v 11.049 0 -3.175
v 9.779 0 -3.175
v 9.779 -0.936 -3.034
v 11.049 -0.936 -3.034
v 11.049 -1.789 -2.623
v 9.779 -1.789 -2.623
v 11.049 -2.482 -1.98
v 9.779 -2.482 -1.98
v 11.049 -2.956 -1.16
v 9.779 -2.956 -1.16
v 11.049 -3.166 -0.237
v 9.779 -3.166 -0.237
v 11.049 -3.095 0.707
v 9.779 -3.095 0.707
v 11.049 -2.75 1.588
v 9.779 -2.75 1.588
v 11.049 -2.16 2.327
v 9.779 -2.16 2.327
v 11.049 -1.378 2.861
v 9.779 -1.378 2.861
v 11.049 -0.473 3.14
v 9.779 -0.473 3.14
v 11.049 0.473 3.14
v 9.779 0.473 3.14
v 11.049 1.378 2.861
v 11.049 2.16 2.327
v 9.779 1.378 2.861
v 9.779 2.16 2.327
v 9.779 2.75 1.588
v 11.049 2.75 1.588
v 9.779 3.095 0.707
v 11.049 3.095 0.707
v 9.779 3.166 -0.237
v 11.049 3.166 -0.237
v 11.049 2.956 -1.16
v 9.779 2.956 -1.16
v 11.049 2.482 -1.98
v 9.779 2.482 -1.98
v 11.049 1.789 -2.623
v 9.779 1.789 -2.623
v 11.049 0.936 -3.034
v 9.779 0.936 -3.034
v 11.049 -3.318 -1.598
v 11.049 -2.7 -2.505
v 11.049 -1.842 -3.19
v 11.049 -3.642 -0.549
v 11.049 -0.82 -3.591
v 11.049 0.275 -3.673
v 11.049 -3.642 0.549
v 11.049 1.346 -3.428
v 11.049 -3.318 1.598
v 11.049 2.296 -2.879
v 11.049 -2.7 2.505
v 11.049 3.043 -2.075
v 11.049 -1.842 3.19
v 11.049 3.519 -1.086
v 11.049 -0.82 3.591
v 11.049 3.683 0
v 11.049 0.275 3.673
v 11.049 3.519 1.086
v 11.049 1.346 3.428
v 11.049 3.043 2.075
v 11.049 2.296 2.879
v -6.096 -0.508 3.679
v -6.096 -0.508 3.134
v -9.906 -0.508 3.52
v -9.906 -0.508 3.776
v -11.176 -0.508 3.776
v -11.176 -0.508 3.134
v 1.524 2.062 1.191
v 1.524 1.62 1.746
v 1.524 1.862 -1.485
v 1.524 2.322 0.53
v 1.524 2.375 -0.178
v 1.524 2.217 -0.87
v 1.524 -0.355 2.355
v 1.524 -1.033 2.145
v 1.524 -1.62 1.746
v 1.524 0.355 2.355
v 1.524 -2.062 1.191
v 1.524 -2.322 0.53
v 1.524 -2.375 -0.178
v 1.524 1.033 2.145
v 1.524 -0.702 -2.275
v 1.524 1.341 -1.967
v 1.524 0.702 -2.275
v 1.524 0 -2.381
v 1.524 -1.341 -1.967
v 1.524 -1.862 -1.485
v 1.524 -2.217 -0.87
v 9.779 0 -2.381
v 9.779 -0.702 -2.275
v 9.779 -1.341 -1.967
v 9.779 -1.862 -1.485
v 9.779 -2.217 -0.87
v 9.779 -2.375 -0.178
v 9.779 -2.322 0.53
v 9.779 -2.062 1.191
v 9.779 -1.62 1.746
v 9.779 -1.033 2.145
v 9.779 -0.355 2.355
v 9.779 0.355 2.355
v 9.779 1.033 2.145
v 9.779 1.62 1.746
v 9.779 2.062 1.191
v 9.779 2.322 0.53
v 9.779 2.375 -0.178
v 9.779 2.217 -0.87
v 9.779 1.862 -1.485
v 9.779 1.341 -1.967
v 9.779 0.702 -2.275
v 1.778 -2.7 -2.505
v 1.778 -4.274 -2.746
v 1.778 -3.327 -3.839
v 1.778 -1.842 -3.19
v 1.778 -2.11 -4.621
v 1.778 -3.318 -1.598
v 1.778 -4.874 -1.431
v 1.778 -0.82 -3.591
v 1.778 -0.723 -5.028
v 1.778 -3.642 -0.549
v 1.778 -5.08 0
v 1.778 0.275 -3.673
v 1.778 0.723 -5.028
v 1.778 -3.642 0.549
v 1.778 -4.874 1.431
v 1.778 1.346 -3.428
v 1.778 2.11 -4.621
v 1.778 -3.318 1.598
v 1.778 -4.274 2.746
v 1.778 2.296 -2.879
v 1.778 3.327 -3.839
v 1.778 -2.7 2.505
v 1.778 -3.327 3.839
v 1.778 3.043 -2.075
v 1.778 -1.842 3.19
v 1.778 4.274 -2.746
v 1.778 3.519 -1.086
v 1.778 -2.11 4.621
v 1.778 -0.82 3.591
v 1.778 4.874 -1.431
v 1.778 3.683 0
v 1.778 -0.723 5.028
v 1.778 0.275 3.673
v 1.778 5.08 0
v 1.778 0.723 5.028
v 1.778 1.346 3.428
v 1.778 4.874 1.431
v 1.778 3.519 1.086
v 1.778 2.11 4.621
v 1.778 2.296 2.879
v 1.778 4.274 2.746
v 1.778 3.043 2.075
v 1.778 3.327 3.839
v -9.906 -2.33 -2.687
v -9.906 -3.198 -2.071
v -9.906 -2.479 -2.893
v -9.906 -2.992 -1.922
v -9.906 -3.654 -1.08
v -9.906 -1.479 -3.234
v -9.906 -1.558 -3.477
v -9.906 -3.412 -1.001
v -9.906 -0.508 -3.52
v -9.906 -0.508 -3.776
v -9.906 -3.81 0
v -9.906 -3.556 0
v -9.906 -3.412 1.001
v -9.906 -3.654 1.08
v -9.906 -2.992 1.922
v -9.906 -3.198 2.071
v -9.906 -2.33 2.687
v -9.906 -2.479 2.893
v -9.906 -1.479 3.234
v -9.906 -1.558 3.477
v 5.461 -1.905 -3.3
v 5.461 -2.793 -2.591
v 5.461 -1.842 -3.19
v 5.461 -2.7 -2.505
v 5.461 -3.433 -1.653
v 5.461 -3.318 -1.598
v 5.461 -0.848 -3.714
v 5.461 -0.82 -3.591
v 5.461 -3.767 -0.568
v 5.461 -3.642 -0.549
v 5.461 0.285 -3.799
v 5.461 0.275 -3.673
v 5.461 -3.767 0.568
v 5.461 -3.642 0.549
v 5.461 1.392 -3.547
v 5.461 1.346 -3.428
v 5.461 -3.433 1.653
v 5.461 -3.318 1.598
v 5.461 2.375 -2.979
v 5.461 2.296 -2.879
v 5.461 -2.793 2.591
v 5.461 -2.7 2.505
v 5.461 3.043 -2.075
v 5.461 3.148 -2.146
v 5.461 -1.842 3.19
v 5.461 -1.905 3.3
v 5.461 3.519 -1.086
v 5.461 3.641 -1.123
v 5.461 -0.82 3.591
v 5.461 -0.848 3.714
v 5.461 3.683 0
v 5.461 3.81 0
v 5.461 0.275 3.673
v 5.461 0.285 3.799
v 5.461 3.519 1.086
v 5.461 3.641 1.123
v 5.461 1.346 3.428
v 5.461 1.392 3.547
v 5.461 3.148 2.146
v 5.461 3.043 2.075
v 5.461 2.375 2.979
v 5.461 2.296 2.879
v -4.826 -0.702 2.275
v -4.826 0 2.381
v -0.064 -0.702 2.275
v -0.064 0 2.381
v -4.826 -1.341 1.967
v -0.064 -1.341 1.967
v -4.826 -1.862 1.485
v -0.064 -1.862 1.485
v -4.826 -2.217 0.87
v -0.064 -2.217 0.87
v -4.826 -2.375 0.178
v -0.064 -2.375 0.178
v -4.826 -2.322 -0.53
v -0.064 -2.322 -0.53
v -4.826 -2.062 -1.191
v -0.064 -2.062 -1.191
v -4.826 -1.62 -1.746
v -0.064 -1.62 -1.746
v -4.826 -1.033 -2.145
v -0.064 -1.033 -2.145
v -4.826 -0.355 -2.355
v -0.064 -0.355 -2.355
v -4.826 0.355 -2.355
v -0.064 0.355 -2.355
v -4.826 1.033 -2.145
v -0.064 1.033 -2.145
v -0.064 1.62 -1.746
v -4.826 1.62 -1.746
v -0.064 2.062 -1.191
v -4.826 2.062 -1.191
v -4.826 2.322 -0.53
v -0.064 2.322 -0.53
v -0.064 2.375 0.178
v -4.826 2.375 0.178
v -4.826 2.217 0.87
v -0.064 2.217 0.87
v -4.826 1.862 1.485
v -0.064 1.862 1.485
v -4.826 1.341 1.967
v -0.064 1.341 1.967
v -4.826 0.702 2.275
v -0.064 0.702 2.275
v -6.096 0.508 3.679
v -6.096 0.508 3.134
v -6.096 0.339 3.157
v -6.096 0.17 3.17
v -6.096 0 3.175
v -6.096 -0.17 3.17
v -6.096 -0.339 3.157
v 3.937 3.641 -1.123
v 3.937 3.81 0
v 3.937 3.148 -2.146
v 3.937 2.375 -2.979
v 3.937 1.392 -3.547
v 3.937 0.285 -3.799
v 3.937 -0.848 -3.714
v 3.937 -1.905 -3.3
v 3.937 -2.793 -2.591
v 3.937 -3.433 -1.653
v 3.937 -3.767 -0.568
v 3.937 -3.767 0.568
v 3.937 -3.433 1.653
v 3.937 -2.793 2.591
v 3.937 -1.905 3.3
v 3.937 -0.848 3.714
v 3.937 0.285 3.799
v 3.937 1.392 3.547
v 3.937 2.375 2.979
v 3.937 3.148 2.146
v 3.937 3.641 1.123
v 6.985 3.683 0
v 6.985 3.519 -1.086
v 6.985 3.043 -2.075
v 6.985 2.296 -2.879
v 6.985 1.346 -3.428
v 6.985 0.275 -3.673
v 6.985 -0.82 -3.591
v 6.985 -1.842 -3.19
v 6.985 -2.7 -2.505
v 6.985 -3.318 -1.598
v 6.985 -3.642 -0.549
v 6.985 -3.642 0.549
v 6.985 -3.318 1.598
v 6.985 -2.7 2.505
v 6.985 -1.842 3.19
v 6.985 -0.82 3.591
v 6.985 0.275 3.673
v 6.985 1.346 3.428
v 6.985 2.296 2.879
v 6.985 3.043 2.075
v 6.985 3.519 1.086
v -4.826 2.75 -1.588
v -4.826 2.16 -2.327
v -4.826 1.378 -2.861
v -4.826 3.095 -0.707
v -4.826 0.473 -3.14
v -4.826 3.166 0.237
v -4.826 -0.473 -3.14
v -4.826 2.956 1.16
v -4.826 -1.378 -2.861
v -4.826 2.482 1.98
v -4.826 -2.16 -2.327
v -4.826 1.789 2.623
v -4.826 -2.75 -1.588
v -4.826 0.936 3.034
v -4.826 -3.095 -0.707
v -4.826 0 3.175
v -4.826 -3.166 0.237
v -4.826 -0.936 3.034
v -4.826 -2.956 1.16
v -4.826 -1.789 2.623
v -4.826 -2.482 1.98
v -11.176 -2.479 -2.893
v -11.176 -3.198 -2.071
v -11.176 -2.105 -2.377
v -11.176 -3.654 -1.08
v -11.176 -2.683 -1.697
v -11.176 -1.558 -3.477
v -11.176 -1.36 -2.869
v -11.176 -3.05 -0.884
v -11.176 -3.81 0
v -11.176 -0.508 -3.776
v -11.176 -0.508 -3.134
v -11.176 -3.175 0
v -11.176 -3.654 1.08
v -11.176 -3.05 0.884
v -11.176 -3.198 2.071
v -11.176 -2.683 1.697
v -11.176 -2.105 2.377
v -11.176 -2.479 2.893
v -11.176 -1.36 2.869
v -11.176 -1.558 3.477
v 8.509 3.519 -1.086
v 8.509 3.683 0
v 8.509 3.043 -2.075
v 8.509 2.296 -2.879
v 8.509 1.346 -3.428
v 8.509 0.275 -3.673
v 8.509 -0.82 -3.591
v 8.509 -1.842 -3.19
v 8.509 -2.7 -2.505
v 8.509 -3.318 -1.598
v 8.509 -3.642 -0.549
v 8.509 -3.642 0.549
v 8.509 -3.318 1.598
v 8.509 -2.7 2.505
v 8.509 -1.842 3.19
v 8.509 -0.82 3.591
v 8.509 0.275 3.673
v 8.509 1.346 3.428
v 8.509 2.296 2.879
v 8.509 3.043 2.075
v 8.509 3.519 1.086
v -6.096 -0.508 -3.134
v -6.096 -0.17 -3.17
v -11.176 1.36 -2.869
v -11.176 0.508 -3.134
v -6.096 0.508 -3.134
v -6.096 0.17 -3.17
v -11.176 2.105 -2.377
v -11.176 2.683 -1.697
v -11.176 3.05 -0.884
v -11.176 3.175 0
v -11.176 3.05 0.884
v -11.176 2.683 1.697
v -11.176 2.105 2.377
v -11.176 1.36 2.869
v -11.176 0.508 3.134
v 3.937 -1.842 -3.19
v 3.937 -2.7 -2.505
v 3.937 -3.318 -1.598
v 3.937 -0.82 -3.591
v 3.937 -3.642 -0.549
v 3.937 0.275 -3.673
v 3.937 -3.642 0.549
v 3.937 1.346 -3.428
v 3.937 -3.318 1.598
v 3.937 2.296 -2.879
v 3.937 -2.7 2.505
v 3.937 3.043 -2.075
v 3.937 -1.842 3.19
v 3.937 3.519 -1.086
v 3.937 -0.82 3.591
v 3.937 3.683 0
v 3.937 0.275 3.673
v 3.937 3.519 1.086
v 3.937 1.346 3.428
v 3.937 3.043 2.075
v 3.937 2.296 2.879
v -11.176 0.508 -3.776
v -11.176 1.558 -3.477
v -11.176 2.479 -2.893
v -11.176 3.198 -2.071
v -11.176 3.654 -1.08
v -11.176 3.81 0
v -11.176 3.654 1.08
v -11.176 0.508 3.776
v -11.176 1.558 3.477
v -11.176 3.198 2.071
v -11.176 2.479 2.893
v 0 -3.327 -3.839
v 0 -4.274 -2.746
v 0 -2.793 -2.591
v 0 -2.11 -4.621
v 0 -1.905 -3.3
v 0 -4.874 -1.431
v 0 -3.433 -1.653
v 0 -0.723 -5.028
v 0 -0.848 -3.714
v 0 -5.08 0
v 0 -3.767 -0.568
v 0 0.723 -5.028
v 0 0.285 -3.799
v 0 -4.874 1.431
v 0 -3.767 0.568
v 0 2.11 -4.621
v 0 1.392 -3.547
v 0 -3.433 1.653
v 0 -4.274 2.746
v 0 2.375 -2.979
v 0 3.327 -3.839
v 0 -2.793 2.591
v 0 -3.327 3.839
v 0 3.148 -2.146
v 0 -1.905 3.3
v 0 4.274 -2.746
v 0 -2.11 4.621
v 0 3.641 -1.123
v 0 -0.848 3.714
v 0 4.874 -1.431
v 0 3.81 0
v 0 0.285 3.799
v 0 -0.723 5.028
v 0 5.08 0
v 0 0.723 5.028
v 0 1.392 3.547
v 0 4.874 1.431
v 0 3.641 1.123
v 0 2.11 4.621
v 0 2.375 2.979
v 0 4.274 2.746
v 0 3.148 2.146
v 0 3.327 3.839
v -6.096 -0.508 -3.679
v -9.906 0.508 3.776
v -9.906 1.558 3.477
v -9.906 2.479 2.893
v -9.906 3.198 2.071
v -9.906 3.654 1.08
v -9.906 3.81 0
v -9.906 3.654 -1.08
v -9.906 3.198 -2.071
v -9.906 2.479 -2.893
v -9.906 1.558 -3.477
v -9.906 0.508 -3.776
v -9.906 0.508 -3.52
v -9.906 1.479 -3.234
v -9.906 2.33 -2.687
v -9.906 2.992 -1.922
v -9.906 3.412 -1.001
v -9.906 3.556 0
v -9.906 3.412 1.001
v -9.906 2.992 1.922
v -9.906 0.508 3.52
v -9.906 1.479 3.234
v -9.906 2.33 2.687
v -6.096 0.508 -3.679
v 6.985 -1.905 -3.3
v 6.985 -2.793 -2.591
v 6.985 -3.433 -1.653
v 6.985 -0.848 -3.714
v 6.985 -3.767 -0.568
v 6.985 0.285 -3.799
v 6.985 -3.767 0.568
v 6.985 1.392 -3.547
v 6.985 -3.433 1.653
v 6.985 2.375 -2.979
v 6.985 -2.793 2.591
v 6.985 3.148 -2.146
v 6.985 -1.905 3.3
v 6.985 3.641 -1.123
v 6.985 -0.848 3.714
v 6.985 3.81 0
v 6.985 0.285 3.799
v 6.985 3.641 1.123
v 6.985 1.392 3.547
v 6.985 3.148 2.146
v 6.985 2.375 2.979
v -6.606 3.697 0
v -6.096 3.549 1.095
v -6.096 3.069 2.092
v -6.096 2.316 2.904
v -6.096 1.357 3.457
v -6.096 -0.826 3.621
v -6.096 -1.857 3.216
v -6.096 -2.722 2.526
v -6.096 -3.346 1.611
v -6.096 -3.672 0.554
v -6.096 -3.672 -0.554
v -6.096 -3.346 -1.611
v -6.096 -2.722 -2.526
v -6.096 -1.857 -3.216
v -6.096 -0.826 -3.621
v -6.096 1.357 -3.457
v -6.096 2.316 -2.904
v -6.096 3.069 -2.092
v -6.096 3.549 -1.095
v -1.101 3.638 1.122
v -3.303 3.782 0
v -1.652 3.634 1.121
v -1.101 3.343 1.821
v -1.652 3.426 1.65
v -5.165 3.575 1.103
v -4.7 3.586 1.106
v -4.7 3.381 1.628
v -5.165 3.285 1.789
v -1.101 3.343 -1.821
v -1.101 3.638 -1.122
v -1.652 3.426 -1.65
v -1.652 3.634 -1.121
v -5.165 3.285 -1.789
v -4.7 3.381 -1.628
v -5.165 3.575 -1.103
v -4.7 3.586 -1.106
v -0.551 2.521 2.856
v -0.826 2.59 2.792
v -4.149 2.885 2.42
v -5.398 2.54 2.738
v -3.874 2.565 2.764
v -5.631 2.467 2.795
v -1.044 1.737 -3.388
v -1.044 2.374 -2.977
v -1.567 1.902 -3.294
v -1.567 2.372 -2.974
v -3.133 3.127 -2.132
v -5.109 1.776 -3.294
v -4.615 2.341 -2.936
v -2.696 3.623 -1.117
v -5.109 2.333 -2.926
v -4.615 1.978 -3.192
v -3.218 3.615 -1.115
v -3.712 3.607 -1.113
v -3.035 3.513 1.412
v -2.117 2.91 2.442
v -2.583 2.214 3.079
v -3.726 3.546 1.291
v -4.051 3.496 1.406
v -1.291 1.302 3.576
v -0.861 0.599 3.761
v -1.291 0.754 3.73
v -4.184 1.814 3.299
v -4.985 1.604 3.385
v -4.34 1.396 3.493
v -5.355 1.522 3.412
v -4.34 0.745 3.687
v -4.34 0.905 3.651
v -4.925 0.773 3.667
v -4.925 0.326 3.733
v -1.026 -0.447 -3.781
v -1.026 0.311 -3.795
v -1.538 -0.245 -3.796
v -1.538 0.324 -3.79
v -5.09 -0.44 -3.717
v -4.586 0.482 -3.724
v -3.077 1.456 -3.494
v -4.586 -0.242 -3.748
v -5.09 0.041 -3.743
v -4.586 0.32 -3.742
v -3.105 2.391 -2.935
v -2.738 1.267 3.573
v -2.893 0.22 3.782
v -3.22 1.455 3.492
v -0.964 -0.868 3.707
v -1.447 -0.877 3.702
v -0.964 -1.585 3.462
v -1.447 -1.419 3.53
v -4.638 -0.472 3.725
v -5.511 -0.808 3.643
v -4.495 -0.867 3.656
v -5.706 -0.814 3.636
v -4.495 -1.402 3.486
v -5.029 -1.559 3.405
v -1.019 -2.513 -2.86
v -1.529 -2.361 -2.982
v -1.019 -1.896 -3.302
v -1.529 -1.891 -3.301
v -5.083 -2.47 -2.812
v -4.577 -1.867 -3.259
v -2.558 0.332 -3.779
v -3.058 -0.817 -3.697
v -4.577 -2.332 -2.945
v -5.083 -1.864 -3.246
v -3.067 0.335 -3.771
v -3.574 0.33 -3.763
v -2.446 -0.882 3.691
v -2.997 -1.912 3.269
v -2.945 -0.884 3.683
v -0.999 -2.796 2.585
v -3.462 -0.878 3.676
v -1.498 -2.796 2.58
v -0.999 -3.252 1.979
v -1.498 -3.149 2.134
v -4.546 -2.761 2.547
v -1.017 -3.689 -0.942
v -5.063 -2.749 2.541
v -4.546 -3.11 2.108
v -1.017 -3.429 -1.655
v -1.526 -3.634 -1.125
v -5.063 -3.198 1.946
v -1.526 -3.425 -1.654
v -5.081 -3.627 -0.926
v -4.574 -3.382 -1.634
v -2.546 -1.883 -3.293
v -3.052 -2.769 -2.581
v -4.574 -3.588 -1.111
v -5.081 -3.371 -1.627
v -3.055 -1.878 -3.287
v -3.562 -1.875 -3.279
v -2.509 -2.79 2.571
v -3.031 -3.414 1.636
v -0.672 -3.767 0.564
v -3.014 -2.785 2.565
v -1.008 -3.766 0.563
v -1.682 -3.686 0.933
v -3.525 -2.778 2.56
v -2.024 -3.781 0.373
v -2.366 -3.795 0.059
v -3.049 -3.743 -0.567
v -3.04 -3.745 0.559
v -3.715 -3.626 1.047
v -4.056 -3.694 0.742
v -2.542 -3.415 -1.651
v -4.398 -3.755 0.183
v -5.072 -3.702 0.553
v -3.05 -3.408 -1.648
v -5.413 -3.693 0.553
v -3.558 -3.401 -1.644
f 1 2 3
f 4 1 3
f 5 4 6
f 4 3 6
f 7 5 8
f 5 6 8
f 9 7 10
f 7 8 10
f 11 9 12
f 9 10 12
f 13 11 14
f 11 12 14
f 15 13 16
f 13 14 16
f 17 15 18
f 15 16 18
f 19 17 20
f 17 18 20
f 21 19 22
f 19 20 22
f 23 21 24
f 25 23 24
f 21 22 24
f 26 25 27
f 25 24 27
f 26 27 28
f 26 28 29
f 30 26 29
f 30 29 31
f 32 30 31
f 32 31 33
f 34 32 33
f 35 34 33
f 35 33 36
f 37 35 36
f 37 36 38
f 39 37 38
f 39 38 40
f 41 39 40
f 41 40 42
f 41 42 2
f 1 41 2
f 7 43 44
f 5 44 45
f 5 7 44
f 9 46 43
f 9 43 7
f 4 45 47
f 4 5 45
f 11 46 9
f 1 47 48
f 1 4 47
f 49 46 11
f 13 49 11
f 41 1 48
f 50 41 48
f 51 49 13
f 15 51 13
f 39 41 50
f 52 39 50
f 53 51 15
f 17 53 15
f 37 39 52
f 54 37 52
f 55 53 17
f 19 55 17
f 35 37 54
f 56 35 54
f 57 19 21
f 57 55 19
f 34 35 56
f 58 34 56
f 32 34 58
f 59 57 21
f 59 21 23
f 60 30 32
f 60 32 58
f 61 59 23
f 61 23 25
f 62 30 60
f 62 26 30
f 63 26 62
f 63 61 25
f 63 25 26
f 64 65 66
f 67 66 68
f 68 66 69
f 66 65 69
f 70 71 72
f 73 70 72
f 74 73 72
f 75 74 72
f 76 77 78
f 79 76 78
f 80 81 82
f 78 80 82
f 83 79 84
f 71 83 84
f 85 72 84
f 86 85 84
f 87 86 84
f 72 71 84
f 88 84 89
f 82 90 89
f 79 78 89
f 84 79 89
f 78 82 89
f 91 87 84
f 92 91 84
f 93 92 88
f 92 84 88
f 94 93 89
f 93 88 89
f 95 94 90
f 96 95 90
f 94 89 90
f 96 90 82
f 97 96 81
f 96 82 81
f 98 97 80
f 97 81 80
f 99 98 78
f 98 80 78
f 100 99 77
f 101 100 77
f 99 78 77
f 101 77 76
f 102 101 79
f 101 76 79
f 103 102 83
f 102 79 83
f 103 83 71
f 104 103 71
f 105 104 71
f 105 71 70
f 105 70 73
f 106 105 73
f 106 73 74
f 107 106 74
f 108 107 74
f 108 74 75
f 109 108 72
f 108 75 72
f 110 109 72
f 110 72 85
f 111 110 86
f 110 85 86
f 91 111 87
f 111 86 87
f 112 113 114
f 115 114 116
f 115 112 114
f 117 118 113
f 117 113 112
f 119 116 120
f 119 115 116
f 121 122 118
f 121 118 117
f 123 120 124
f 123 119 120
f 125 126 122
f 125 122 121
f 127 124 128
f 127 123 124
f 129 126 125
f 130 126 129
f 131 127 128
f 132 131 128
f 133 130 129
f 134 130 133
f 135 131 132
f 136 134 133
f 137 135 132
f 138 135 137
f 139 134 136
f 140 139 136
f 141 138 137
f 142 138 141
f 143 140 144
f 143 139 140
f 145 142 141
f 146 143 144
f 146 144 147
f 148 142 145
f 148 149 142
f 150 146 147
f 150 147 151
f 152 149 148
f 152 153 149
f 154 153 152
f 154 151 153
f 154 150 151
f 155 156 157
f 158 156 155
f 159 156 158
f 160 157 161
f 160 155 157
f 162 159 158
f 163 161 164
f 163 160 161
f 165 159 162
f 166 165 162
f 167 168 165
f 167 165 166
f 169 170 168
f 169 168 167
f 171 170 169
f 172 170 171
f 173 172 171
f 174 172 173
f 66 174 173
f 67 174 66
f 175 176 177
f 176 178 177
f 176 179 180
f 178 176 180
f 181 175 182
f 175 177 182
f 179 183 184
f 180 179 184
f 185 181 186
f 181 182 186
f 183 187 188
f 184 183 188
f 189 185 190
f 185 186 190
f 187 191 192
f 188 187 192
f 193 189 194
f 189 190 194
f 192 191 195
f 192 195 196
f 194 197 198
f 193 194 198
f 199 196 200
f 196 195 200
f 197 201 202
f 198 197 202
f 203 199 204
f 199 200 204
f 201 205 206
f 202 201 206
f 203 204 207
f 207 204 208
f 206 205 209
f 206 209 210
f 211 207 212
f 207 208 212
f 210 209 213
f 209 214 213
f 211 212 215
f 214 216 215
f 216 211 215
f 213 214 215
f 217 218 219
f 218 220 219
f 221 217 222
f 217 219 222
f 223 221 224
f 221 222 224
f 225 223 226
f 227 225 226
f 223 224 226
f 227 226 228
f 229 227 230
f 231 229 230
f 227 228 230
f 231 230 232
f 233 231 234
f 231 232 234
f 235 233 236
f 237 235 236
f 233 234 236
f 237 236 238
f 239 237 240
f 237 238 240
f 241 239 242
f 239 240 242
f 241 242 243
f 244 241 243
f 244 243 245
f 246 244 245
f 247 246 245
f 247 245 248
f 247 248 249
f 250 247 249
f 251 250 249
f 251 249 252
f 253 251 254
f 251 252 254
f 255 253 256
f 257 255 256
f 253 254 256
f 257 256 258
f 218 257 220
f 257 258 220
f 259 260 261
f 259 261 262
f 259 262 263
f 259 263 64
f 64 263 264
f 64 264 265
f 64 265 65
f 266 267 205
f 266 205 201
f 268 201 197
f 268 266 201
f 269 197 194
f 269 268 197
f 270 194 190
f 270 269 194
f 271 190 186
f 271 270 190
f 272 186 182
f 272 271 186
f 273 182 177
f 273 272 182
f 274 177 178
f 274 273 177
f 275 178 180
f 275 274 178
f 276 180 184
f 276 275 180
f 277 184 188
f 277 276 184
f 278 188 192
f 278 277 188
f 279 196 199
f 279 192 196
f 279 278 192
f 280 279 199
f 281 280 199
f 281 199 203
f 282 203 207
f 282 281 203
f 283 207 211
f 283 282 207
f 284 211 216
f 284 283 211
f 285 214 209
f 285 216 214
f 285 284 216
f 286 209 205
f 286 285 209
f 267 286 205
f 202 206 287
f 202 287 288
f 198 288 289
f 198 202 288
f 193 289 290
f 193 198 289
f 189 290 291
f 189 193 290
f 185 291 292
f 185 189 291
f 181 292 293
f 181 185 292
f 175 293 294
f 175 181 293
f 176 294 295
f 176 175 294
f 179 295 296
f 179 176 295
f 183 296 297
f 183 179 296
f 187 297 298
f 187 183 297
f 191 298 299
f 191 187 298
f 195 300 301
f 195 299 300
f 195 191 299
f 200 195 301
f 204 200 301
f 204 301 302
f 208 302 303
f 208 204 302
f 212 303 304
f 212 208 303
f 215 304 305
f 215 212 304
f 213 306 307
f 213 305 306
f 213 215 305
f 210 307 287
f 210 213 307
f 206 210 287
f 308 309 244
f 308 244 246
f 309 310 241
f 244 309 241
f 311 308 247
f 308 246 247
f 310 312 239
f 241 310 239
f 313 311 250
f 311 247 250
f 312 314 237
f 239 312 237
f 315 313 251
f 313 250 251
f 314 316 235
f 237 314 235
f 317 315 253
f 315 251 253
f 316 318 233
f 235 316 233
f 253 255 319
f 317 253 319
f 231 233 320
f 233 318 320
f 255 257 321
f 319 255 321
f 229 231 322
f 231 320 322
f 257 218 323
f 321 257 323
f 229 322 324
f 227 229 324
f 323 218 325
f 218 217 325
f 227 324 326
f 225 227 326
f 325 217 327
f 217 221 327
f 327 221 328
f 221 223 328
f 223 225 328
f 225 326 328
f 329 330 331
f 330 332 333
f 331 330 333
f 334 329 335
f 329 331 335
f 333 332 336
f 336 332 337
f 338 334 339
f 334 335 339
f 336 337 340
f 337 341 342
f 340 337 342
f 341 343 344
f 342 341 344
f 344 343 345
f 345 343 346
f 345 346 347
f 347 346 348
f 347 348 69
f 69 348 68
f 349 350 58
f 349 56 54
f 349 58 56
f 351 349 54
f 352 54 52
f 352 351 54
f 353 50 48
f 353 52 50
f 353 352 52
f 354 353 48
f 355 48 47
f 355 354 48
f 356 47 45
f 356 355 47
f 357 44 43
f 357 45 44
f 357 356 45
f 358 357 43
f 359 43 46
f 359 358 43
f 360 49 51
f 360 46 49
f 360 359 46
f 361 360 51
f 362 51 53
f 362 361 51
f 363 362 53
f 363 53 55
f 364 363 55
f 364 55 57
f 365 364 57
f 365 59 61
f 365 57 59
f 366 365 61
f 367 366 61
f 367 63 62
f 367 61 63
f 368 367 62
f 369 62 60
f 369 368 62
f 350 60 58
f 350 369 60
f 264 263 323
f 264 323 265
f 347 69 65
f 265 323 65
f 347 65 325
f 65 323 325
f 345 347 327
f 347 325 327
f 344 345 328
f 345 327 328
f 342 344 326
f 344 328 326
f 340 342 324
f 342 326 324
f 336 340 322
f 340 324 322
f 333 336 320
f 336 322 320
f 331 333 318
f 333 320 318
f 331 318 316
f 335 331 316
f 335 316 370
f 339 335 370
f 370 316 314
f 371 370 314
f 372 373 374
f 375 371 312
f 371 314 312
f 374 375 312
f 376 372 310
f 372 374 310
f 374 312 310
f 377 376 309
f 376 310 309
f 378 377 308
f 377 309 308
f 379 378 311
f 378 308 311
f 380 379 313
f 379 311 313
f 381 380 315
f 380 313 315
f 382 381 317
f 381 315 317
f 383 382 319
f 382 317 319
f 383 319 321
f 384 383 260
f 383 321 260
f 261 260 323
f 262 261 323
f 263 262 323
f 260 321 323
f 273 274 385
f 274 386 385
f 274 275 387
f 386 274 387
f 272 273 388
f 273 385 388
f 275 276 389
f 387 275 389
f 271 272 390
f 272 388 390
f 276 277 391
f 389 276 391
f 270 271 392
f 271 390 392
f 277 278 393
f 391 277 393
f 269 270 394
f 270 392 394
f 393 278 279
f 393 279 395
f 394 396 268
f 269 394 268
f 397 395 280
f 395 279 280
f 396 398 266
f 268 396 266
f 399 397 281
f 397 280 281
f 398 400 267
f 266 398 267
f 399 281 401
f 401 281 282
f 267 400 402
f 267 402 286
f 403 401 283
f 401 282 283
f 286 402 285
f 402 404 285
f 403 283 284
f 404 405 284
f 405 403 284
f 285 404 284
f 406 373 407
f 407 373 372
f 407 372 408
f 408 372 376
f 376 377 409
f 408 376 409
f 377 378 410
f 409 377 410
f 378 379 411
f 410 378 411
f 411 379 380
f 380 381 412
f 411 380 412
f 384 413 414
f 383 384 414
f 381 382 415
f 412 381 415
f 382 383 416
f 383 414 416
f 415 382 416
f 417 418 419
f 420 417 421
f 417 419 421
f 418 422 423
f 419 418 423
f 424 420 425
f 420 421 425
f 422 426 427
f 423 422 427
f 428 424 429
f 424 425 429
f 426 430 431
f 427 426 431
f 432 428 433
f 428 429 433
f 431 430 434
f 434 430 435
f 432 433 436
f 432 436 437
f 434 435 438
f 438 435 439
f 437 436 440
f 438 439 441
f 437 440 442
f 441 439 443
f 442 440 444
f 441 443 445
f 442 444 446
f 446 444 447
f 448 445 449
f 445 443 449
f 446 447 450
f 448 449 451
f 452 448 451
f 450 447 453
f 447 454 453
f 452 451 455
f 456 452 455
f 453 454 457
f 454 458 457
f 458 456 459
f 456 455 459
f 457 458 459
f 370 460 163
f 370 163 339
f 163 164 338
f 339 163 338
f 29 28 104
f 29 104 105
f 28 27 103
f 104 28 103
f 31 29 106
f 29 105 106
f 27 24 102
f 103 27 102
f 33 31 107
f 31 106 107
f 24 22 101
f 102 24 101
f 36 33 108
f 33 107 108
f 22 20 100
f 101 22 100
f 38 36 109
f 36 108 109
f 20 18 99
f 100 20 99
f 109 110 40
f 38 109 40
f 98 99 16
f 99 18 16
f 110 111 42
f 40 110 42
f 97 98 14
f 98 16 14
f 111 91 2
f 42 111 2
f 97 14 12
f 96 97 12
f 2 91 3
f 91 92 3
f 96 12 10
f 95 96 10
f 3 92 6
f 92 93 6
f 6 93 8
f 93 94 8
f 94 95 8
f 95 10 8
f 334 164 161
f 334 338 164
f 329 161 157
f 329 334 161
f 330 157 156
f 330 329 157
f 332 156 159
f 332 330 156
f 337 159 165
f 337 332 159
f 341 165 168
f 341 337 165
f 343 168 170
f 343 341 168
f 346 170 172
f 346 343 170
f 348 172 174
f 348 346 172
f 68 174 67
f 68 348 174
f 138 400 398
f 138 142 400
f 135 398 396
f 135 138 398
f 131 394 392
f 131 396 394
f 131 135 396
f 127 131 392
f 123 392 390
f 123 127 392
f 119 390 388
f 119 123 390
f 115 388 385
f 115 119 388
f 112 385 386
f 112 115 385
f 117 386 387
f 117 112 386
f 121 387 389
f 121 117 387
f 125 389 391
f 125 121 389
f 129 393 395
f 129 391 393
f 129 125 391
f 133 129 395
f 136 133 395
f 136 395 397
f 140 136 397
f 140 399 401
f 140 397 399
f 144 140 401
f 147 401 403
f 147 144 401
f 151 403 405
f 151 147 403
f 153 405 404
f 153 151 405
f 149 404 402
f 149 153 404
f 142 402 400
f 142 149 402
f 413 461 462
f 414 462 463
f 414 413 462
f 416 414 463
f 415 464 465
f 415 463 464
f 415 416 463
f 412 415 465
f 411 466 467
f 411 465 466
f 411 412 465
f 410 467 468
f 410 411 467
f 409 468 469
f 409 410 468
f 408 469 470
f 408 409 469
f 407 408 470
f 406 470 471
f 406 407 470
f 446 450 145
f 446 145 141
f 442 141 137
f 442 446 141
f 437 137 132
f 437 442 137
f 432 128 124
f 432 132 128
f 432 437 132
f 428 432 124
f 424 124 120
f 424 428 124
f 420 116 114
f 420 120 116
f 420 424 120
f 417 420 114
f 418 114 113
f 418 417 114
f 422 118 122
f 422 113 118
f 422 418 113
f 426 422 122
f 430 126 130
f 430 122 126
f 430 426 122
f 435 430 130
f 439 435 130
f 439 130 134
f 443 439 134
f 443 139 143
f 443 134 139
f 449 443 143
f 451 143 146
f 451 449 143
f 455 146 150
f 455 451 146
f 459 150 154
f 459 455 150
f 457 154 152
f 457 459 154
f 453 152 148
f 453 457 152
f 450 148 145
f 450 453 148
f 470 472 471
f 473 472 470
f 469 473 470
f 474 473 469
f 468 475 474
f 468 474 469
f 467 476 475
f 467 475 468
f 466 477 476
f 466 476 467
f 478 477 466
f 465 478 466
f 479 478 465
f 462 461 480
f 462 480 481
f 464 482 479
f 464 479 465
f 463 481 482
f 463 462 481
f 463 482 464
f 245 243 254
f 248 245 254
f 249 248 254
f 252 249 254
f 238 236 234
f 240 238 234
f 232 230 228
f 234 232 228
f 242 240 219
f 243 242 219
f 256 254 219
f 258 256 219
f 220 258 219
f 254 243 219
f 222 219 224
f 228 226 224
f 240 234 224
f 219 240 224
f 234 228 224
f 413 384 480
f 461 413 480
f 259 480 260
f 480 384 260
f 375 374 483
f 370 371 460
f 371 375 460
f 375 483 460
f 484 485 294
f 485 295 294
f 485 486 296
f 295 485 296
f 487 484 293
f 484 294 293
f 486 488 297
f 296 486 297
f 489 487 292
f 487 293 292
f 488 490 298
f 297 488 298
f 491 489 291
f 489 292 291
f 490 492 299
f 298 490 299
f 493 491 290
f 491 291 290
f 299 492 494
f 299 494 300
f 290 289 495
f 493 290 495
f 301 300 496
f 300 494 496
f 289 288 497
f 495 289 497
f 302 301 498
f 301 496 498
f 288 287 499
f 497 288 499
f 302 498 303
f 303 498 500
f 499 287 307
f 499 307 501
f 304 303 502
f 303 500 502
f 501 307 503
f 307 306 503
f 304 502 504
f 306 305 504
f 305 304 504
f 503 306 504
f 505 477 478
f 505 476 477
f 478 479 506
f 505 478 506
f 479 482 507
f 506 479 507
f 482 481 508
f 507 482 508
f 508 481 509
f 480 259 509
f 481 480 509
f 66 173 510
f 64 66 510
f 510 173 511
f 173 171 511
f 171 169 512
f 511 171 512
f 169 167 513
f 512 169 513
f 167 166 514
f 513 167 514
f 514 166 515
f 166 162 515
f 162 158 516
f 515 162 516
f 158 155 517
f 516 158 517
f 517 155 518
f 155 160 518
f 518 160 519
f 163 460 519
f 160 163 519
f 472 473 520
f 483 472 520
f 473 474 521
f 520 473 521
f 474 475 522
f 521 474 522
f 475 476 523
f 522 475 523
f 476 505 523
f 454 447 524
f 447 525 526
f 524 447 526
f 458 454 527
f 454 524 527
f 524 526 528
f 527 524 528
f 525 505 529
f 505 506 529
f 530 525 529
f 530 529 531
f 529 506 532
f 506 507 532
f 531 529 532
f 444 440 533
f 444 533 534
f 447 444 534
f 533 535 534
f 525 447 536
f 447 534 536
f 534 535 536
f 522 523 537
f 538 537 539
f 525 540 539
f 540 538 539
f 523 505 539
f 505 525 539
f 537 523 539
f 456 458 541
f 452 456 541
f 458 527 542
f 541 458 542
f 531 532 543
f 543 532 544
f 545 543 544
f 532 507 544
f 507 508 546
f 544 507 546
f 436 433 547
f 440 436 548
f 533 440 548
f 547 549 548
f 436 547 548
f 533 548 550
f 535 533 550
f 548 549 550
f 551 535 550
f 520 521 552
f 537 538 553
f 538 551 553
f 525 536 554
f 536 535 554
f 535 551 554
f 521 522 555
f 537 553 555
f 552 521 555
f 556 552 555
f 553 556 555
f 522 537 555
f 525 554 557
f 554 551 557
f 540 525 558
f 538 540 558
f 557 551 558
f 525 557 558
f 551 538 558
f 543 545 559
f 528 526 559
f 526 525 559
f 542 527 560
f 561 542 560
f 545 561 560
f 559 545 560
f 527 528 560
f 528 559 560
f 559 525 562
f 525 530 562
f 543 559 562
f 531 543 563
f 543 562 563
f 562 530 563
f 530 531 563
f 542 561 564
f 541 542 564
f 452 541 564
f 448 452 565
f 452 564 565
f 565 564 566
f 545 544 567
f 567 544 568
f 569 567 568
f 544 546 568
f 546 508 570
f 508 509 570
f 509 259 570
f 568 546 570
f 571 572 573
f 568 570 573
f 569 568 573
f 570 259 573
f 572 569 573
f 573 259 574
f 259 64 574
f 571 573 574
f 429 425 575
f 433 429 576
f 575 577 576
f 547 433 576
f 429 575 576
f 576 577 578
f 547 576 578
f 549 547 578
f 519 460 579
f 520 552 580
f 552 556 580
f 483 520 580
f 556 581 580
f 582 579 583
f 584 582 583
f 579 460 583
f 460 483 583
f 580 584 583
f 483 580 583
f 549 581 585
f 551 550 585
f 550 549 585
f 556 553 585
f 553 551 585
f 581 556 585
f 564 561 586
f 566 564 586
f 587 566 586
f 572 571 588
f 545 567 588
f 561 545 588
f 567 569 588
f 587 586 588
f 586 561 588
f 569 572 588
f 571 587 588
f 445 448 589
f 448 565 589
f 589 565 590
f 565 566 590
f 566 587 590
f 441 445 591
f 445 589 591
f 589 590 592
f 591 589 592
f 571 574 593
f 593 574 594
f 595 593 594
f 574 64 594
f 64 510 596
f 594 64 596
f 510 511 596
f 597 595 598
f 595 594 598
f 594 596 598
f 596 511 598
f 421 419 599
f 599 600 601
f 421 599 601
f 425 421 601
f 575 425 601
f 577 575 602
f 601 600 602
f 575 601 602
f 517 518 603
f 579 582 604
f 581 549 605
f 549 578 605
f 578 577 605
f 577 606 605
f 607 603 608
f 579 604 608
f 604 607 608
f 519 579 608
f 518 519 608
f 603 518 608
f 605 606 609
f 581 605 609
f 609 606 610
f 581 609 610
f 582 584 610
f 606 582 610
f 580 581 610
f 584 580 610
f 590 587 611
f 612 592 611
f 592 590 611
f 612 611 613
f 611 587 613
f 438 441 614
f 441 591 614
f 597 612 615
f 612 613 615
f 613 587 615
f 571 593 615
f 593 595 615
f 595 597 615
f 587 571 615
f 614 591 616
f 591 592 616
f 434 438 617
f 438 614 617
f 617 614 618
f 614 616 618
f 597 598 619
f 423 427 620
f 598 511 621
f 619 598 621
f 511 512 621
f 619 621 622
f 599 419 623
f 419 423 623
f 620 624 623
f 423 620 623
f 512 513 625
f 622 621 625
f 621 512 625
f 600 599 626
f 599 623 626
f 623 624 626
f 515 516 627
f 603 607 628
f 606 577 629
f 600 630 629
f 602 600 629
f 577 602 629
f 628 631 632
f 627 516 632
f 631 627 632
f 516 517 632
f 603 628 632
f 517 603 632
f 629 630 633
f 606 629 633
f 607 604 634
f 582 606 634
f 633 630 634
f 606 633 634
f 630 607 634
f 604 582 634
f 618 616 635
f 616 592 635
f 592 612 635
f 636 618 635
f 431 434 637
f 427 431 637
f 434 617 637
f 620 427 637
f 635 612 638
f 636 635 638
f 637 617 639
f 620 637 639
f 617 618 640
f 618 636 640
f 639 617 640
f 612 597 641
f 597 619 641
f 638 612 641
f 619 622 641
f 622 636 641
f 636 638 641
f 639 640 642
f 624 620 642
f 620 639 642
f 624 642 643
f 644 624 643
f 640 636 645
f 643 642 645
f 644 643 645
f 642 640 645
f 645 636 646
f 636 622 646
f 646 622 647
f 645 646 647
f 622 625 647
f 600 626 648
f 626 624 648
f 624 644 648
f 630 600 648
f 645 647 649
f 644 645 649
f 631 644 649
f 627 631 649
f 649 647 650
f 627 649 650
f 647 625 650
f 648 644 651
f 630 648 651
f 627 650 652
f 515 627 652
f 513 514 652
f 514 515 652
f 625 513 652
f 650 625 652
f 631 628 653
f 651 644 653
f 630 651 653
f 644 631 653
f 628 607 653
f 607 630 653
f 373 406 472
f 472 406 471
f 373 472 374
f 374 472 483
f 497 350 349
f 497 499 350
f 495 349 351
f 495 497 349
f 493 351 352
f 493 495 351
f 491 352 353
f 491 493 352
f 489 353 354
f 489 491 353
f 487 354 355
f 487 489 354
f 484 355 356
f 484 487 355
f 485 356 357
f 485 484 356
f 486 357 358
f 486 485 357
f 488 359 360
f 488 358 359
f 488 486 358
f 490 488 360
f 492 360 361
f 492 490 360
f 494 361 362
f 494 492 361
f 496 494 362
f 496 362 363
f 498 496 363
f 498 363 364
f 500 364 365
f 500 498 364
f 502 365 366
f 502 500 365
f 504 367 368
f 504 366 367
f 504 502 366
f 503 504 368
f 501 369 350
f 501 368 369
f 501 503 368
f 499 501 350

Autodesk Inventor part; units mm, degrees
ref_plane "YZ Plane" through (0, 0, 0) normal (1, 0, 0) x (0, 1, 0)
ref_plane "XZ Plane" through (0, 0, 0) normal (0, 1, 0) x (-1, 0, 0)
ref_plane "XY Plane" through (0, 0, 0) normal (0, 0, 1) x (1, 0, 0)
sketch "Sketch1" plane through (0, 0, 0) normal (0, 0, 1) x (1, 0, 0)
  line L0 (0, 0) -> (1.778, 0)
  line L1 (1.778, 0) -> (1.778, 5.08)
  line L2 (1.778, 5.08) -> (0, 5.08)
  line L3 (0, 5.08) -> (0, 0)
  line L4 (1.778, 0) -> (11.049, 0)
  line L5 (11.049, 0) -> (11.049, 3.683)
  line L6 (11.049, 3.683) -> (1.778, 3.683)
  line L7 (1.778, 3.683) -> (1.778, 0)
  line L8 (8.509, 3.683) -> (6.985, 3.81)
  line L9 (6.985, 3.81) -> (6.985, 3.683)
  line L10 (6.985, 3.683) -> (5.461, 3.81)
  line L11 (5.461, 3.81) -> (5.461, 3.683)
  line L12 (5.461, 3.683) -> (3.937, 3.81)
  line L13 (3.937, 3.81) -> (3.937, 3.683)
  line L14 (0, 0) -> (0, 3.1252)
  line L15 (0, 3.81) -> (0.889, 3.81) construction
  line L16 (0, 3.81) -> (0, 0)
  arc A0 (0, 3.81) -> (-9.906, 3.556) centre (0, -189.484) ccw
  line L17 (-9.906, 3.556) -> (-9.906, 3.81)
  line L18 (-9.906, 3.81) -> (-11.176, 3.81)
  line L19 (-11.176, 3.81) -> (-11.176, 0)
  line L20 (-11.176, 0) -> (0, 0)
  dimension "d0" = 1.778
  dimension "d1" = 10.16
  dimension "d2" = 9.271
  dimension "d3" = 7.366
  dimension "d4" = 7.62
  dimension "d5" = 2.54
  dimension "d6" = 1.524
  dimension "d7" = 7.62
  dimension "d8" = 7.62
  dimension "d9" = 11.176
  dimension "d10" = 7.112
  dimension "d11" = 1.27
revolve "Revolution1" add sketch "Sketch1" angle 360 about axis through (-11.176, 0, 0) along (1, 0, 0)
sketch "Sketch2" plane through (0, 0, 0) normal (0, 0, 1) x (1, 0, 0)
  line L0 (-11.176, 0.508) -> (-6.096, 0.508)
  line L1 (-6.096, 0.508) -> (-6.096, -0.508)
  line L2 (-6.096, -0.508) -> (-11.176, -0.508)
  line L3 (-11.176, -0.508) -> (-11.176, 0.508)
  line L4 (-11.176, -3.81) -> (-11.176, 3.81) construction
  point P0 (0, 0)
  point P1 (-11.176, 0)
  dimension "d13" = 1.016
  dimension "d14" = 5.08
extrude "Extrusion1" cut sketch "Sketch2" along normal through all both and the other way through all
hole "Hole1" at (-11.176, 0, 0) direction (1, 0, 0) diameter 4.7625 depth 11.1125 counterbore diameter 6.35 counterbore depth 6.35
hole "Hole2" at (11.049, 0, 0) direction (-1, 0, 0) diameter 4.7625 depth 9.525 counterbore diameter 6.35 counterbore depth 1.27
equation "\"d8\" = d7"
properties part number "T9 Axle"
